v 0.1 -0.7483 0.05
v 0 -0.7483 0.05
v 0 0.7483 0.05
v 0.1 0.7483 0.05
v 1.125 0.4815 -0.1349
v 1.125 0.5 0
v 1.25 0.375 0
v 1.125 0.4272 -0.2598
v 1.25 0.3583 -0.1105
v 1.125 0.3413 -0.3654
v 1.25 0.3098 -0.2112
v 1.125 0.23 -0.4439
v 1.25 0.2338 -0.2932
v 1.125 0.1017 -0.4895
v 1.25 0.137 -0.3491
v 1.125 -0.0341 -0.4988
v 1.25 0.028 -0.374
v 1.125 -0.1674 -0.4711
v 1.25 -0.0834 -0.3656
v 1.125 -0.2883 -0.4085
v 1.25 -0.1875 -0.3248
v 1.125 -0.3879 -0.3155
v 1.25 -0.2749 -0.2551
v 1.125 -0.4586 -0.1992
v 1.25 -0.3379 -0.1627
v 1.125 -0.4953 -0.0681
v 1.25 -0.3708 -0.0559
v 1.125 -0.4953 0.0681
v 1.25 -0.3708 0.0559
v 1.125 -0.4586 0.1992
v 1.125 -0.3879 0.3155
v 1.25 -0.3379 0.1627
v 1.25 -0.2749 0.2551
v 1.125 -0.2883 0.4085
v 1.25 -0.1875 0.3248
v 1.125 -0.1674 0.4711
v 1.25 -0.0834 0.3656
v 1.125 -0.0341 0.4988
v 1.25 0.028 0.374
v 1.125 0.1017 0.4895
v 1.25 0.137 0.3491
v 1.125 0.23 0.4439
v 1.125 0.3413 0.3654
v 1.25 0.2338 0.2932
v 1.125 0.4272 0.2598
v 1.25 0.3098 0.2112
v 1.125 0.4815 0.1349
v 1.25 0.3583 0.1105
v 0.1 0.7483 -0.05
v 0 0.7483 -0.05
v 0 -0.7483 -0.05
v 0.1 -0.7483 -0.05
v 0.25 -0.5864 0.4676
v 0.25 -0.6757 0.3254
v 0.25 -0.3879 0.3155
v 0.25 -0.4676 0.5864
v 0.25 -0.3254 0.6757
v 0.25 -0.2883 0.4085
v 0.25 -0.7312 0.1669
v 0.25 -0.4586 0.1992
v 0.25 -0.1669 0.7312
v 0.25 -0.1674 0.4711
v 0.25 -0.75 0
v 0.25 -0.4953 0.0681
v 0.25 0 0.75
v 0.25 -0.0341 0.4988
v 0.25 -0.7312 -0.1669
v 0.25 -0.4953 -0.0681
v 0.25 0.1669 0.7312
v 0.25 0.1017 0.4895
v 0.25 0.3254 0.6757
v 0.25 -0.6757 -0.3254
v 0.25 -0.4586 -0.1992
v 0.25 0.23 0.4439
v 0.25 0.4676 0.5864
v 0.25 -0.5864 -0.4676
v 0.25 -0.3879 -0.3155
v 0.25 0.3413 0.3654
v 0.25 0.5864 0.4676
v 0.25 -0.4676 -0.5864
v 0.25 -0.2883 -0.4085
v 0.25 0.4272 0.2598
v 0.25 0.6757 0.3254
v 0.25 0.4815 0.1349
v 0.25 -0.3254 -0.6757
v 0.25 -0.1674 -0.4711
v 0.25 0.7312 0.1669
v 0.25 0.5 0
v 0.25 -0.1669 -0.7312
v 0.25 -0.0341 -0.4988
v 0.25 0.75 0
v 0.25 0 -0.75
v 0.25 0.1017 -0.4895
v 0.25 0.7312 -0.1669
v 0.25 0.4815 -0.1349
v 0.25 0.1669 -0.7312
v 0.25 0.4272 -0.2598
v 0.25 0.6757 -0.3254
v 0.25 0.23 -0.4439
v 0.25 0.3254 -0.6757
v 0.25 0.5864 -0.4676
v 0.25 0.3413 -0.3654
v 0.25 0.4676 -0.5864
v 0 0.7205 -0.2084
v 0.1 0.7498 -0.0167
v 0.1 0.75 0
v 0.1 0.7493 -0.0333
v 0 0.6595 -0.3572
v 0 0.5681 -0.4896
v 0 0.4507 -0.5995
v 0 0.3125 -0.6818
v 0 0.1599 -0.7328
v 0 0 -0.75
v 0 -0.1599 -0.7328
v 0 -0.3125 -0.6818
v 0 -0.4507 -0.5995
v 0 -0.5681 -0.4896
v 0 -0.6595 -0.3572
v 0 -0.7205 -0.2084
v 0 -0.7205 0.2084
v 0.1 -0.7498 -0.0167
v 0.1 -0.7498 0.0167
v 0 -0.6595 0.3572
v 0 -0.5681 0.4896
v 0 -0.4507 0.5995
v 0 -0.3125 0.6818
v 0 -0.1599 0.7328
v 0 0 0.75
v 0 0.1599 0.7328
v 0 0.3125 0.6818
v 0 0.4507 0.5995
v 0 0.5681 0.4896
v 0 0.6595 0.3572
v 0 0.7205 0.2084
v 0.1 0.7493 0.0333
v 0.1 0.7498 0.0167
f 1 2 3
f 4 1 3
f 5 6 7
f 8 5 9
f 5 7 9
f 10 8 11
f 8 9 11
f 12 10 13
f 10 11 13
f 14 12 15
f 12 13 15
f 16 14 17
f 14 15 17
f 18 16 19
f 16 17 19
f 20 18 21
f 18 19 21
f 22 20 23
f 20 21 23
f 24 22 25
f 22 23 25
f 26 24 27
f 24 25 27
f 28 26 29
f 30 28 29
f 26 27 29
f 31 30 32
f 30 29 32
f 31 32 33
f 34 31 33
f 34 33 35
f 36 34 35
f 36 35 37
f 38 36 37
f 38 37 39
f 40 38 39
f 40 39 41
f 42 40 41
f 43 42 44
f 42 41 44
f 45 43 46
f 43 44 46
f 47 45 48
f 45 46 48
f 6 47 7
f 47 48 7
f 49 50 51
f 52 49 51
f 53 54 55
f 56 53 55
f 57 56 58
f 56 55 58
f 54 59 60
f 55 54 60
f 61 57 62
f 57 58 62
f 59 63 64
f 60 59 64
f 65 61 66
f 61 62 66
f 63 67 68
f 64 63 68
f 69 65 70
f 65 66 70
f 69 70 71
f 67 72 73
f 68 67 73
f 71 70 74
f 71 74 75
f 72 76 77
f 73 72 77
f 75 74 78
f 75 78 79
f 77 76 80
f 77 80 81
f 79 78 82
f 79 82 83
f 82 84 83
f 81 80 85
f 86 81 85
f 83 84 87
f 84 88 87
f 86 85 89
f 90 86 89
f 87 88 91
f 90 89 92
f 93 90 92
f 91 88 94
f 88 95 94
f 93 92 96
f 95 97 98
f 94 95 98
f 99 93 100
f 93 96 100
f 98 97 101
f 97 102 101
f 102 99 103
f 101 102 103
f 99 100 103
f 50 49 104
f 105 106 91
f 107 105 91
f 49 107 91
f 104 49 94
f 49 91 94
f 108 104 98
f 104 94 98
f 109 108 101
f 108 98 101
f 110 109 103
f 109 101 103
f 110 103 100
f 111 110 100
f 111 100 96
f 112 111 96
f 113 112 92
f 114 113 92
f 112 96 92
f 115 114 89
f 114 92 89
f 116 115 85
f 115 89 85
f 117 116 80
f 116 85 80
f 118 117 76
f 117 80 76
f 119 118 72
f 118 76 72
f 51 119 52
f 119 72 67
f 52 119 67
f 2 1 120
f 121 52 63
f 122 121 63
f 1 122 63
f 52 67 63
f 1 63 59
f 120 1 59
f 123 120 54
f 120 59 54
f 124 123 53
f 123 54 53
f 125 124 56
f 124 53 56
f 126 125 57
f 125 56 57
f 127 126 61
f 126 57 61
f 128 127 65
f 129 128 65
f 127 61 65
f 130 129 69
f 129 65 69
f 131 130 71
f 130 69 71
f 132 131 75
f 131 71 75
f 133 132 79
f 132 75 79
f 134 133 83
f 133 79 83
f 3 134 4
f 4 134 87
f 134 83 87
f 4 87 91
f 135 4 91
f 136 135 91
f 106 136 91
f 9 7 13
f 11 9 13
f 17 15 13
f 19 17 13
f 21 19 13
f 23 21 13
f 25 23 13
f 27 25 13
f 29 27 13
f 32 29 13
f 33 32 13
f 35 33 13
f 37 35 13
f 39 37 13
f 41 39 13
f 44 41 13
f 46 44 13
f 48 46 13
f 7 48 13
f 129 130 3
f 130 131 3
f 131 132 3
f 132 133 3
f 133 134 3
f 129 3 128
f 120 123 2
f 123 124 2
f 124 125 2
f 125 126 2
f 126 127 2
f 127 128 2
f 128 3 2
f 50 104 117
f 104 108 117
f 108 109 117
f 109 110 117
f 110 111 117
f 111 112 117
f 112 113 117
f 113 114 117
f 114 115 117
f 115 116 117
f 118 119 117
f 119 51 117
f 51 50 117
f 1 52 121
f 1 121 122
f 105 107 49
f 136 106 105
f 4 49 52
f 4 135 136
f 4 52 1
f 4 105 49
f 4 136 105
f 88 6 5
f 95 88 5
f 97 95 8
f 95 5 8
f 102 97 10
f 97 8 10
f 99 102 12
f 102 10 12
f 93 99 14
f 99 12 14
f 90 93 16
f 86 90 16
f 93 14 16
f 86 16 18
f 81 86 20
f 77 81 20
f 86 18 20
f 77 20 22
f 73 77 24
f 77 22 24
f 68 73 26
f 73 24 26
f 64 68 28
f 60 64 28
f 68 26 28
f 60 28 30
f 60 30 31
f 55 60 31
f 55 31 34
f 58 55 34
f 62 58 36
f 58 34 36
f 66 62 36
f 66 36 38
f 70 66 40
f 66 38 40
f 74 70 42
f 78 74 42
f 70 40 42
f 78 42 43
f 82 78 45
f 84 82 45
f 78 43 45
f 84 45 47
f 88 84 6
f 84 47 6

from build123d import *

# Parameters (mm, degrees)
CHAFL_N1_SIZE         = 0.125
CORTAR_EXTRUIR6_DEPTH = 0.1


with BuildPart() as part:
    # Croquis1 → Revolución1 (revolve)
    with BuildSketch(Plane.XY):
        Polygon((0, 0), (0, 0.75), (0.25, 0.75), (0.25, 0.5), (1.25, 0.5), (1.25, 0), align=None)
    revolve(axis=Axis((1.25, 0, 0), (-1, 0, 0)))

    # Chaflán1
    chafl_n1_edges = [part.edges().sort_by_distance(p)[0] for p in [
        (1.25, -0.5, 0),
    ]]
    chamfer(chafl_n1_edges, length=CHAFL_N1_SIZE)

    # Croquis5 → Cortar-Extruir6 (cut)
    with BuildSketch(Plane.ZY):
        with BuildLine():
            Line((-0.05, 0.748331477), (-0.05, -0.748331477))
            ThreePointArc((-0.05, -0.748331477), (0, -0.75), (0.05, -0.748331477))
            Line((0.05, -0.748331477), (0.05, 0.748331477))
            ThreePointArc((0.05, 0.748331477), (0, 0.75), (-0.05, 0.748331477))
        make_face()
    extrude(amount=-CORTAR_EXTRUIR6_DEPTH, mode=Mode.SUBTRACT)


solid = part.part
